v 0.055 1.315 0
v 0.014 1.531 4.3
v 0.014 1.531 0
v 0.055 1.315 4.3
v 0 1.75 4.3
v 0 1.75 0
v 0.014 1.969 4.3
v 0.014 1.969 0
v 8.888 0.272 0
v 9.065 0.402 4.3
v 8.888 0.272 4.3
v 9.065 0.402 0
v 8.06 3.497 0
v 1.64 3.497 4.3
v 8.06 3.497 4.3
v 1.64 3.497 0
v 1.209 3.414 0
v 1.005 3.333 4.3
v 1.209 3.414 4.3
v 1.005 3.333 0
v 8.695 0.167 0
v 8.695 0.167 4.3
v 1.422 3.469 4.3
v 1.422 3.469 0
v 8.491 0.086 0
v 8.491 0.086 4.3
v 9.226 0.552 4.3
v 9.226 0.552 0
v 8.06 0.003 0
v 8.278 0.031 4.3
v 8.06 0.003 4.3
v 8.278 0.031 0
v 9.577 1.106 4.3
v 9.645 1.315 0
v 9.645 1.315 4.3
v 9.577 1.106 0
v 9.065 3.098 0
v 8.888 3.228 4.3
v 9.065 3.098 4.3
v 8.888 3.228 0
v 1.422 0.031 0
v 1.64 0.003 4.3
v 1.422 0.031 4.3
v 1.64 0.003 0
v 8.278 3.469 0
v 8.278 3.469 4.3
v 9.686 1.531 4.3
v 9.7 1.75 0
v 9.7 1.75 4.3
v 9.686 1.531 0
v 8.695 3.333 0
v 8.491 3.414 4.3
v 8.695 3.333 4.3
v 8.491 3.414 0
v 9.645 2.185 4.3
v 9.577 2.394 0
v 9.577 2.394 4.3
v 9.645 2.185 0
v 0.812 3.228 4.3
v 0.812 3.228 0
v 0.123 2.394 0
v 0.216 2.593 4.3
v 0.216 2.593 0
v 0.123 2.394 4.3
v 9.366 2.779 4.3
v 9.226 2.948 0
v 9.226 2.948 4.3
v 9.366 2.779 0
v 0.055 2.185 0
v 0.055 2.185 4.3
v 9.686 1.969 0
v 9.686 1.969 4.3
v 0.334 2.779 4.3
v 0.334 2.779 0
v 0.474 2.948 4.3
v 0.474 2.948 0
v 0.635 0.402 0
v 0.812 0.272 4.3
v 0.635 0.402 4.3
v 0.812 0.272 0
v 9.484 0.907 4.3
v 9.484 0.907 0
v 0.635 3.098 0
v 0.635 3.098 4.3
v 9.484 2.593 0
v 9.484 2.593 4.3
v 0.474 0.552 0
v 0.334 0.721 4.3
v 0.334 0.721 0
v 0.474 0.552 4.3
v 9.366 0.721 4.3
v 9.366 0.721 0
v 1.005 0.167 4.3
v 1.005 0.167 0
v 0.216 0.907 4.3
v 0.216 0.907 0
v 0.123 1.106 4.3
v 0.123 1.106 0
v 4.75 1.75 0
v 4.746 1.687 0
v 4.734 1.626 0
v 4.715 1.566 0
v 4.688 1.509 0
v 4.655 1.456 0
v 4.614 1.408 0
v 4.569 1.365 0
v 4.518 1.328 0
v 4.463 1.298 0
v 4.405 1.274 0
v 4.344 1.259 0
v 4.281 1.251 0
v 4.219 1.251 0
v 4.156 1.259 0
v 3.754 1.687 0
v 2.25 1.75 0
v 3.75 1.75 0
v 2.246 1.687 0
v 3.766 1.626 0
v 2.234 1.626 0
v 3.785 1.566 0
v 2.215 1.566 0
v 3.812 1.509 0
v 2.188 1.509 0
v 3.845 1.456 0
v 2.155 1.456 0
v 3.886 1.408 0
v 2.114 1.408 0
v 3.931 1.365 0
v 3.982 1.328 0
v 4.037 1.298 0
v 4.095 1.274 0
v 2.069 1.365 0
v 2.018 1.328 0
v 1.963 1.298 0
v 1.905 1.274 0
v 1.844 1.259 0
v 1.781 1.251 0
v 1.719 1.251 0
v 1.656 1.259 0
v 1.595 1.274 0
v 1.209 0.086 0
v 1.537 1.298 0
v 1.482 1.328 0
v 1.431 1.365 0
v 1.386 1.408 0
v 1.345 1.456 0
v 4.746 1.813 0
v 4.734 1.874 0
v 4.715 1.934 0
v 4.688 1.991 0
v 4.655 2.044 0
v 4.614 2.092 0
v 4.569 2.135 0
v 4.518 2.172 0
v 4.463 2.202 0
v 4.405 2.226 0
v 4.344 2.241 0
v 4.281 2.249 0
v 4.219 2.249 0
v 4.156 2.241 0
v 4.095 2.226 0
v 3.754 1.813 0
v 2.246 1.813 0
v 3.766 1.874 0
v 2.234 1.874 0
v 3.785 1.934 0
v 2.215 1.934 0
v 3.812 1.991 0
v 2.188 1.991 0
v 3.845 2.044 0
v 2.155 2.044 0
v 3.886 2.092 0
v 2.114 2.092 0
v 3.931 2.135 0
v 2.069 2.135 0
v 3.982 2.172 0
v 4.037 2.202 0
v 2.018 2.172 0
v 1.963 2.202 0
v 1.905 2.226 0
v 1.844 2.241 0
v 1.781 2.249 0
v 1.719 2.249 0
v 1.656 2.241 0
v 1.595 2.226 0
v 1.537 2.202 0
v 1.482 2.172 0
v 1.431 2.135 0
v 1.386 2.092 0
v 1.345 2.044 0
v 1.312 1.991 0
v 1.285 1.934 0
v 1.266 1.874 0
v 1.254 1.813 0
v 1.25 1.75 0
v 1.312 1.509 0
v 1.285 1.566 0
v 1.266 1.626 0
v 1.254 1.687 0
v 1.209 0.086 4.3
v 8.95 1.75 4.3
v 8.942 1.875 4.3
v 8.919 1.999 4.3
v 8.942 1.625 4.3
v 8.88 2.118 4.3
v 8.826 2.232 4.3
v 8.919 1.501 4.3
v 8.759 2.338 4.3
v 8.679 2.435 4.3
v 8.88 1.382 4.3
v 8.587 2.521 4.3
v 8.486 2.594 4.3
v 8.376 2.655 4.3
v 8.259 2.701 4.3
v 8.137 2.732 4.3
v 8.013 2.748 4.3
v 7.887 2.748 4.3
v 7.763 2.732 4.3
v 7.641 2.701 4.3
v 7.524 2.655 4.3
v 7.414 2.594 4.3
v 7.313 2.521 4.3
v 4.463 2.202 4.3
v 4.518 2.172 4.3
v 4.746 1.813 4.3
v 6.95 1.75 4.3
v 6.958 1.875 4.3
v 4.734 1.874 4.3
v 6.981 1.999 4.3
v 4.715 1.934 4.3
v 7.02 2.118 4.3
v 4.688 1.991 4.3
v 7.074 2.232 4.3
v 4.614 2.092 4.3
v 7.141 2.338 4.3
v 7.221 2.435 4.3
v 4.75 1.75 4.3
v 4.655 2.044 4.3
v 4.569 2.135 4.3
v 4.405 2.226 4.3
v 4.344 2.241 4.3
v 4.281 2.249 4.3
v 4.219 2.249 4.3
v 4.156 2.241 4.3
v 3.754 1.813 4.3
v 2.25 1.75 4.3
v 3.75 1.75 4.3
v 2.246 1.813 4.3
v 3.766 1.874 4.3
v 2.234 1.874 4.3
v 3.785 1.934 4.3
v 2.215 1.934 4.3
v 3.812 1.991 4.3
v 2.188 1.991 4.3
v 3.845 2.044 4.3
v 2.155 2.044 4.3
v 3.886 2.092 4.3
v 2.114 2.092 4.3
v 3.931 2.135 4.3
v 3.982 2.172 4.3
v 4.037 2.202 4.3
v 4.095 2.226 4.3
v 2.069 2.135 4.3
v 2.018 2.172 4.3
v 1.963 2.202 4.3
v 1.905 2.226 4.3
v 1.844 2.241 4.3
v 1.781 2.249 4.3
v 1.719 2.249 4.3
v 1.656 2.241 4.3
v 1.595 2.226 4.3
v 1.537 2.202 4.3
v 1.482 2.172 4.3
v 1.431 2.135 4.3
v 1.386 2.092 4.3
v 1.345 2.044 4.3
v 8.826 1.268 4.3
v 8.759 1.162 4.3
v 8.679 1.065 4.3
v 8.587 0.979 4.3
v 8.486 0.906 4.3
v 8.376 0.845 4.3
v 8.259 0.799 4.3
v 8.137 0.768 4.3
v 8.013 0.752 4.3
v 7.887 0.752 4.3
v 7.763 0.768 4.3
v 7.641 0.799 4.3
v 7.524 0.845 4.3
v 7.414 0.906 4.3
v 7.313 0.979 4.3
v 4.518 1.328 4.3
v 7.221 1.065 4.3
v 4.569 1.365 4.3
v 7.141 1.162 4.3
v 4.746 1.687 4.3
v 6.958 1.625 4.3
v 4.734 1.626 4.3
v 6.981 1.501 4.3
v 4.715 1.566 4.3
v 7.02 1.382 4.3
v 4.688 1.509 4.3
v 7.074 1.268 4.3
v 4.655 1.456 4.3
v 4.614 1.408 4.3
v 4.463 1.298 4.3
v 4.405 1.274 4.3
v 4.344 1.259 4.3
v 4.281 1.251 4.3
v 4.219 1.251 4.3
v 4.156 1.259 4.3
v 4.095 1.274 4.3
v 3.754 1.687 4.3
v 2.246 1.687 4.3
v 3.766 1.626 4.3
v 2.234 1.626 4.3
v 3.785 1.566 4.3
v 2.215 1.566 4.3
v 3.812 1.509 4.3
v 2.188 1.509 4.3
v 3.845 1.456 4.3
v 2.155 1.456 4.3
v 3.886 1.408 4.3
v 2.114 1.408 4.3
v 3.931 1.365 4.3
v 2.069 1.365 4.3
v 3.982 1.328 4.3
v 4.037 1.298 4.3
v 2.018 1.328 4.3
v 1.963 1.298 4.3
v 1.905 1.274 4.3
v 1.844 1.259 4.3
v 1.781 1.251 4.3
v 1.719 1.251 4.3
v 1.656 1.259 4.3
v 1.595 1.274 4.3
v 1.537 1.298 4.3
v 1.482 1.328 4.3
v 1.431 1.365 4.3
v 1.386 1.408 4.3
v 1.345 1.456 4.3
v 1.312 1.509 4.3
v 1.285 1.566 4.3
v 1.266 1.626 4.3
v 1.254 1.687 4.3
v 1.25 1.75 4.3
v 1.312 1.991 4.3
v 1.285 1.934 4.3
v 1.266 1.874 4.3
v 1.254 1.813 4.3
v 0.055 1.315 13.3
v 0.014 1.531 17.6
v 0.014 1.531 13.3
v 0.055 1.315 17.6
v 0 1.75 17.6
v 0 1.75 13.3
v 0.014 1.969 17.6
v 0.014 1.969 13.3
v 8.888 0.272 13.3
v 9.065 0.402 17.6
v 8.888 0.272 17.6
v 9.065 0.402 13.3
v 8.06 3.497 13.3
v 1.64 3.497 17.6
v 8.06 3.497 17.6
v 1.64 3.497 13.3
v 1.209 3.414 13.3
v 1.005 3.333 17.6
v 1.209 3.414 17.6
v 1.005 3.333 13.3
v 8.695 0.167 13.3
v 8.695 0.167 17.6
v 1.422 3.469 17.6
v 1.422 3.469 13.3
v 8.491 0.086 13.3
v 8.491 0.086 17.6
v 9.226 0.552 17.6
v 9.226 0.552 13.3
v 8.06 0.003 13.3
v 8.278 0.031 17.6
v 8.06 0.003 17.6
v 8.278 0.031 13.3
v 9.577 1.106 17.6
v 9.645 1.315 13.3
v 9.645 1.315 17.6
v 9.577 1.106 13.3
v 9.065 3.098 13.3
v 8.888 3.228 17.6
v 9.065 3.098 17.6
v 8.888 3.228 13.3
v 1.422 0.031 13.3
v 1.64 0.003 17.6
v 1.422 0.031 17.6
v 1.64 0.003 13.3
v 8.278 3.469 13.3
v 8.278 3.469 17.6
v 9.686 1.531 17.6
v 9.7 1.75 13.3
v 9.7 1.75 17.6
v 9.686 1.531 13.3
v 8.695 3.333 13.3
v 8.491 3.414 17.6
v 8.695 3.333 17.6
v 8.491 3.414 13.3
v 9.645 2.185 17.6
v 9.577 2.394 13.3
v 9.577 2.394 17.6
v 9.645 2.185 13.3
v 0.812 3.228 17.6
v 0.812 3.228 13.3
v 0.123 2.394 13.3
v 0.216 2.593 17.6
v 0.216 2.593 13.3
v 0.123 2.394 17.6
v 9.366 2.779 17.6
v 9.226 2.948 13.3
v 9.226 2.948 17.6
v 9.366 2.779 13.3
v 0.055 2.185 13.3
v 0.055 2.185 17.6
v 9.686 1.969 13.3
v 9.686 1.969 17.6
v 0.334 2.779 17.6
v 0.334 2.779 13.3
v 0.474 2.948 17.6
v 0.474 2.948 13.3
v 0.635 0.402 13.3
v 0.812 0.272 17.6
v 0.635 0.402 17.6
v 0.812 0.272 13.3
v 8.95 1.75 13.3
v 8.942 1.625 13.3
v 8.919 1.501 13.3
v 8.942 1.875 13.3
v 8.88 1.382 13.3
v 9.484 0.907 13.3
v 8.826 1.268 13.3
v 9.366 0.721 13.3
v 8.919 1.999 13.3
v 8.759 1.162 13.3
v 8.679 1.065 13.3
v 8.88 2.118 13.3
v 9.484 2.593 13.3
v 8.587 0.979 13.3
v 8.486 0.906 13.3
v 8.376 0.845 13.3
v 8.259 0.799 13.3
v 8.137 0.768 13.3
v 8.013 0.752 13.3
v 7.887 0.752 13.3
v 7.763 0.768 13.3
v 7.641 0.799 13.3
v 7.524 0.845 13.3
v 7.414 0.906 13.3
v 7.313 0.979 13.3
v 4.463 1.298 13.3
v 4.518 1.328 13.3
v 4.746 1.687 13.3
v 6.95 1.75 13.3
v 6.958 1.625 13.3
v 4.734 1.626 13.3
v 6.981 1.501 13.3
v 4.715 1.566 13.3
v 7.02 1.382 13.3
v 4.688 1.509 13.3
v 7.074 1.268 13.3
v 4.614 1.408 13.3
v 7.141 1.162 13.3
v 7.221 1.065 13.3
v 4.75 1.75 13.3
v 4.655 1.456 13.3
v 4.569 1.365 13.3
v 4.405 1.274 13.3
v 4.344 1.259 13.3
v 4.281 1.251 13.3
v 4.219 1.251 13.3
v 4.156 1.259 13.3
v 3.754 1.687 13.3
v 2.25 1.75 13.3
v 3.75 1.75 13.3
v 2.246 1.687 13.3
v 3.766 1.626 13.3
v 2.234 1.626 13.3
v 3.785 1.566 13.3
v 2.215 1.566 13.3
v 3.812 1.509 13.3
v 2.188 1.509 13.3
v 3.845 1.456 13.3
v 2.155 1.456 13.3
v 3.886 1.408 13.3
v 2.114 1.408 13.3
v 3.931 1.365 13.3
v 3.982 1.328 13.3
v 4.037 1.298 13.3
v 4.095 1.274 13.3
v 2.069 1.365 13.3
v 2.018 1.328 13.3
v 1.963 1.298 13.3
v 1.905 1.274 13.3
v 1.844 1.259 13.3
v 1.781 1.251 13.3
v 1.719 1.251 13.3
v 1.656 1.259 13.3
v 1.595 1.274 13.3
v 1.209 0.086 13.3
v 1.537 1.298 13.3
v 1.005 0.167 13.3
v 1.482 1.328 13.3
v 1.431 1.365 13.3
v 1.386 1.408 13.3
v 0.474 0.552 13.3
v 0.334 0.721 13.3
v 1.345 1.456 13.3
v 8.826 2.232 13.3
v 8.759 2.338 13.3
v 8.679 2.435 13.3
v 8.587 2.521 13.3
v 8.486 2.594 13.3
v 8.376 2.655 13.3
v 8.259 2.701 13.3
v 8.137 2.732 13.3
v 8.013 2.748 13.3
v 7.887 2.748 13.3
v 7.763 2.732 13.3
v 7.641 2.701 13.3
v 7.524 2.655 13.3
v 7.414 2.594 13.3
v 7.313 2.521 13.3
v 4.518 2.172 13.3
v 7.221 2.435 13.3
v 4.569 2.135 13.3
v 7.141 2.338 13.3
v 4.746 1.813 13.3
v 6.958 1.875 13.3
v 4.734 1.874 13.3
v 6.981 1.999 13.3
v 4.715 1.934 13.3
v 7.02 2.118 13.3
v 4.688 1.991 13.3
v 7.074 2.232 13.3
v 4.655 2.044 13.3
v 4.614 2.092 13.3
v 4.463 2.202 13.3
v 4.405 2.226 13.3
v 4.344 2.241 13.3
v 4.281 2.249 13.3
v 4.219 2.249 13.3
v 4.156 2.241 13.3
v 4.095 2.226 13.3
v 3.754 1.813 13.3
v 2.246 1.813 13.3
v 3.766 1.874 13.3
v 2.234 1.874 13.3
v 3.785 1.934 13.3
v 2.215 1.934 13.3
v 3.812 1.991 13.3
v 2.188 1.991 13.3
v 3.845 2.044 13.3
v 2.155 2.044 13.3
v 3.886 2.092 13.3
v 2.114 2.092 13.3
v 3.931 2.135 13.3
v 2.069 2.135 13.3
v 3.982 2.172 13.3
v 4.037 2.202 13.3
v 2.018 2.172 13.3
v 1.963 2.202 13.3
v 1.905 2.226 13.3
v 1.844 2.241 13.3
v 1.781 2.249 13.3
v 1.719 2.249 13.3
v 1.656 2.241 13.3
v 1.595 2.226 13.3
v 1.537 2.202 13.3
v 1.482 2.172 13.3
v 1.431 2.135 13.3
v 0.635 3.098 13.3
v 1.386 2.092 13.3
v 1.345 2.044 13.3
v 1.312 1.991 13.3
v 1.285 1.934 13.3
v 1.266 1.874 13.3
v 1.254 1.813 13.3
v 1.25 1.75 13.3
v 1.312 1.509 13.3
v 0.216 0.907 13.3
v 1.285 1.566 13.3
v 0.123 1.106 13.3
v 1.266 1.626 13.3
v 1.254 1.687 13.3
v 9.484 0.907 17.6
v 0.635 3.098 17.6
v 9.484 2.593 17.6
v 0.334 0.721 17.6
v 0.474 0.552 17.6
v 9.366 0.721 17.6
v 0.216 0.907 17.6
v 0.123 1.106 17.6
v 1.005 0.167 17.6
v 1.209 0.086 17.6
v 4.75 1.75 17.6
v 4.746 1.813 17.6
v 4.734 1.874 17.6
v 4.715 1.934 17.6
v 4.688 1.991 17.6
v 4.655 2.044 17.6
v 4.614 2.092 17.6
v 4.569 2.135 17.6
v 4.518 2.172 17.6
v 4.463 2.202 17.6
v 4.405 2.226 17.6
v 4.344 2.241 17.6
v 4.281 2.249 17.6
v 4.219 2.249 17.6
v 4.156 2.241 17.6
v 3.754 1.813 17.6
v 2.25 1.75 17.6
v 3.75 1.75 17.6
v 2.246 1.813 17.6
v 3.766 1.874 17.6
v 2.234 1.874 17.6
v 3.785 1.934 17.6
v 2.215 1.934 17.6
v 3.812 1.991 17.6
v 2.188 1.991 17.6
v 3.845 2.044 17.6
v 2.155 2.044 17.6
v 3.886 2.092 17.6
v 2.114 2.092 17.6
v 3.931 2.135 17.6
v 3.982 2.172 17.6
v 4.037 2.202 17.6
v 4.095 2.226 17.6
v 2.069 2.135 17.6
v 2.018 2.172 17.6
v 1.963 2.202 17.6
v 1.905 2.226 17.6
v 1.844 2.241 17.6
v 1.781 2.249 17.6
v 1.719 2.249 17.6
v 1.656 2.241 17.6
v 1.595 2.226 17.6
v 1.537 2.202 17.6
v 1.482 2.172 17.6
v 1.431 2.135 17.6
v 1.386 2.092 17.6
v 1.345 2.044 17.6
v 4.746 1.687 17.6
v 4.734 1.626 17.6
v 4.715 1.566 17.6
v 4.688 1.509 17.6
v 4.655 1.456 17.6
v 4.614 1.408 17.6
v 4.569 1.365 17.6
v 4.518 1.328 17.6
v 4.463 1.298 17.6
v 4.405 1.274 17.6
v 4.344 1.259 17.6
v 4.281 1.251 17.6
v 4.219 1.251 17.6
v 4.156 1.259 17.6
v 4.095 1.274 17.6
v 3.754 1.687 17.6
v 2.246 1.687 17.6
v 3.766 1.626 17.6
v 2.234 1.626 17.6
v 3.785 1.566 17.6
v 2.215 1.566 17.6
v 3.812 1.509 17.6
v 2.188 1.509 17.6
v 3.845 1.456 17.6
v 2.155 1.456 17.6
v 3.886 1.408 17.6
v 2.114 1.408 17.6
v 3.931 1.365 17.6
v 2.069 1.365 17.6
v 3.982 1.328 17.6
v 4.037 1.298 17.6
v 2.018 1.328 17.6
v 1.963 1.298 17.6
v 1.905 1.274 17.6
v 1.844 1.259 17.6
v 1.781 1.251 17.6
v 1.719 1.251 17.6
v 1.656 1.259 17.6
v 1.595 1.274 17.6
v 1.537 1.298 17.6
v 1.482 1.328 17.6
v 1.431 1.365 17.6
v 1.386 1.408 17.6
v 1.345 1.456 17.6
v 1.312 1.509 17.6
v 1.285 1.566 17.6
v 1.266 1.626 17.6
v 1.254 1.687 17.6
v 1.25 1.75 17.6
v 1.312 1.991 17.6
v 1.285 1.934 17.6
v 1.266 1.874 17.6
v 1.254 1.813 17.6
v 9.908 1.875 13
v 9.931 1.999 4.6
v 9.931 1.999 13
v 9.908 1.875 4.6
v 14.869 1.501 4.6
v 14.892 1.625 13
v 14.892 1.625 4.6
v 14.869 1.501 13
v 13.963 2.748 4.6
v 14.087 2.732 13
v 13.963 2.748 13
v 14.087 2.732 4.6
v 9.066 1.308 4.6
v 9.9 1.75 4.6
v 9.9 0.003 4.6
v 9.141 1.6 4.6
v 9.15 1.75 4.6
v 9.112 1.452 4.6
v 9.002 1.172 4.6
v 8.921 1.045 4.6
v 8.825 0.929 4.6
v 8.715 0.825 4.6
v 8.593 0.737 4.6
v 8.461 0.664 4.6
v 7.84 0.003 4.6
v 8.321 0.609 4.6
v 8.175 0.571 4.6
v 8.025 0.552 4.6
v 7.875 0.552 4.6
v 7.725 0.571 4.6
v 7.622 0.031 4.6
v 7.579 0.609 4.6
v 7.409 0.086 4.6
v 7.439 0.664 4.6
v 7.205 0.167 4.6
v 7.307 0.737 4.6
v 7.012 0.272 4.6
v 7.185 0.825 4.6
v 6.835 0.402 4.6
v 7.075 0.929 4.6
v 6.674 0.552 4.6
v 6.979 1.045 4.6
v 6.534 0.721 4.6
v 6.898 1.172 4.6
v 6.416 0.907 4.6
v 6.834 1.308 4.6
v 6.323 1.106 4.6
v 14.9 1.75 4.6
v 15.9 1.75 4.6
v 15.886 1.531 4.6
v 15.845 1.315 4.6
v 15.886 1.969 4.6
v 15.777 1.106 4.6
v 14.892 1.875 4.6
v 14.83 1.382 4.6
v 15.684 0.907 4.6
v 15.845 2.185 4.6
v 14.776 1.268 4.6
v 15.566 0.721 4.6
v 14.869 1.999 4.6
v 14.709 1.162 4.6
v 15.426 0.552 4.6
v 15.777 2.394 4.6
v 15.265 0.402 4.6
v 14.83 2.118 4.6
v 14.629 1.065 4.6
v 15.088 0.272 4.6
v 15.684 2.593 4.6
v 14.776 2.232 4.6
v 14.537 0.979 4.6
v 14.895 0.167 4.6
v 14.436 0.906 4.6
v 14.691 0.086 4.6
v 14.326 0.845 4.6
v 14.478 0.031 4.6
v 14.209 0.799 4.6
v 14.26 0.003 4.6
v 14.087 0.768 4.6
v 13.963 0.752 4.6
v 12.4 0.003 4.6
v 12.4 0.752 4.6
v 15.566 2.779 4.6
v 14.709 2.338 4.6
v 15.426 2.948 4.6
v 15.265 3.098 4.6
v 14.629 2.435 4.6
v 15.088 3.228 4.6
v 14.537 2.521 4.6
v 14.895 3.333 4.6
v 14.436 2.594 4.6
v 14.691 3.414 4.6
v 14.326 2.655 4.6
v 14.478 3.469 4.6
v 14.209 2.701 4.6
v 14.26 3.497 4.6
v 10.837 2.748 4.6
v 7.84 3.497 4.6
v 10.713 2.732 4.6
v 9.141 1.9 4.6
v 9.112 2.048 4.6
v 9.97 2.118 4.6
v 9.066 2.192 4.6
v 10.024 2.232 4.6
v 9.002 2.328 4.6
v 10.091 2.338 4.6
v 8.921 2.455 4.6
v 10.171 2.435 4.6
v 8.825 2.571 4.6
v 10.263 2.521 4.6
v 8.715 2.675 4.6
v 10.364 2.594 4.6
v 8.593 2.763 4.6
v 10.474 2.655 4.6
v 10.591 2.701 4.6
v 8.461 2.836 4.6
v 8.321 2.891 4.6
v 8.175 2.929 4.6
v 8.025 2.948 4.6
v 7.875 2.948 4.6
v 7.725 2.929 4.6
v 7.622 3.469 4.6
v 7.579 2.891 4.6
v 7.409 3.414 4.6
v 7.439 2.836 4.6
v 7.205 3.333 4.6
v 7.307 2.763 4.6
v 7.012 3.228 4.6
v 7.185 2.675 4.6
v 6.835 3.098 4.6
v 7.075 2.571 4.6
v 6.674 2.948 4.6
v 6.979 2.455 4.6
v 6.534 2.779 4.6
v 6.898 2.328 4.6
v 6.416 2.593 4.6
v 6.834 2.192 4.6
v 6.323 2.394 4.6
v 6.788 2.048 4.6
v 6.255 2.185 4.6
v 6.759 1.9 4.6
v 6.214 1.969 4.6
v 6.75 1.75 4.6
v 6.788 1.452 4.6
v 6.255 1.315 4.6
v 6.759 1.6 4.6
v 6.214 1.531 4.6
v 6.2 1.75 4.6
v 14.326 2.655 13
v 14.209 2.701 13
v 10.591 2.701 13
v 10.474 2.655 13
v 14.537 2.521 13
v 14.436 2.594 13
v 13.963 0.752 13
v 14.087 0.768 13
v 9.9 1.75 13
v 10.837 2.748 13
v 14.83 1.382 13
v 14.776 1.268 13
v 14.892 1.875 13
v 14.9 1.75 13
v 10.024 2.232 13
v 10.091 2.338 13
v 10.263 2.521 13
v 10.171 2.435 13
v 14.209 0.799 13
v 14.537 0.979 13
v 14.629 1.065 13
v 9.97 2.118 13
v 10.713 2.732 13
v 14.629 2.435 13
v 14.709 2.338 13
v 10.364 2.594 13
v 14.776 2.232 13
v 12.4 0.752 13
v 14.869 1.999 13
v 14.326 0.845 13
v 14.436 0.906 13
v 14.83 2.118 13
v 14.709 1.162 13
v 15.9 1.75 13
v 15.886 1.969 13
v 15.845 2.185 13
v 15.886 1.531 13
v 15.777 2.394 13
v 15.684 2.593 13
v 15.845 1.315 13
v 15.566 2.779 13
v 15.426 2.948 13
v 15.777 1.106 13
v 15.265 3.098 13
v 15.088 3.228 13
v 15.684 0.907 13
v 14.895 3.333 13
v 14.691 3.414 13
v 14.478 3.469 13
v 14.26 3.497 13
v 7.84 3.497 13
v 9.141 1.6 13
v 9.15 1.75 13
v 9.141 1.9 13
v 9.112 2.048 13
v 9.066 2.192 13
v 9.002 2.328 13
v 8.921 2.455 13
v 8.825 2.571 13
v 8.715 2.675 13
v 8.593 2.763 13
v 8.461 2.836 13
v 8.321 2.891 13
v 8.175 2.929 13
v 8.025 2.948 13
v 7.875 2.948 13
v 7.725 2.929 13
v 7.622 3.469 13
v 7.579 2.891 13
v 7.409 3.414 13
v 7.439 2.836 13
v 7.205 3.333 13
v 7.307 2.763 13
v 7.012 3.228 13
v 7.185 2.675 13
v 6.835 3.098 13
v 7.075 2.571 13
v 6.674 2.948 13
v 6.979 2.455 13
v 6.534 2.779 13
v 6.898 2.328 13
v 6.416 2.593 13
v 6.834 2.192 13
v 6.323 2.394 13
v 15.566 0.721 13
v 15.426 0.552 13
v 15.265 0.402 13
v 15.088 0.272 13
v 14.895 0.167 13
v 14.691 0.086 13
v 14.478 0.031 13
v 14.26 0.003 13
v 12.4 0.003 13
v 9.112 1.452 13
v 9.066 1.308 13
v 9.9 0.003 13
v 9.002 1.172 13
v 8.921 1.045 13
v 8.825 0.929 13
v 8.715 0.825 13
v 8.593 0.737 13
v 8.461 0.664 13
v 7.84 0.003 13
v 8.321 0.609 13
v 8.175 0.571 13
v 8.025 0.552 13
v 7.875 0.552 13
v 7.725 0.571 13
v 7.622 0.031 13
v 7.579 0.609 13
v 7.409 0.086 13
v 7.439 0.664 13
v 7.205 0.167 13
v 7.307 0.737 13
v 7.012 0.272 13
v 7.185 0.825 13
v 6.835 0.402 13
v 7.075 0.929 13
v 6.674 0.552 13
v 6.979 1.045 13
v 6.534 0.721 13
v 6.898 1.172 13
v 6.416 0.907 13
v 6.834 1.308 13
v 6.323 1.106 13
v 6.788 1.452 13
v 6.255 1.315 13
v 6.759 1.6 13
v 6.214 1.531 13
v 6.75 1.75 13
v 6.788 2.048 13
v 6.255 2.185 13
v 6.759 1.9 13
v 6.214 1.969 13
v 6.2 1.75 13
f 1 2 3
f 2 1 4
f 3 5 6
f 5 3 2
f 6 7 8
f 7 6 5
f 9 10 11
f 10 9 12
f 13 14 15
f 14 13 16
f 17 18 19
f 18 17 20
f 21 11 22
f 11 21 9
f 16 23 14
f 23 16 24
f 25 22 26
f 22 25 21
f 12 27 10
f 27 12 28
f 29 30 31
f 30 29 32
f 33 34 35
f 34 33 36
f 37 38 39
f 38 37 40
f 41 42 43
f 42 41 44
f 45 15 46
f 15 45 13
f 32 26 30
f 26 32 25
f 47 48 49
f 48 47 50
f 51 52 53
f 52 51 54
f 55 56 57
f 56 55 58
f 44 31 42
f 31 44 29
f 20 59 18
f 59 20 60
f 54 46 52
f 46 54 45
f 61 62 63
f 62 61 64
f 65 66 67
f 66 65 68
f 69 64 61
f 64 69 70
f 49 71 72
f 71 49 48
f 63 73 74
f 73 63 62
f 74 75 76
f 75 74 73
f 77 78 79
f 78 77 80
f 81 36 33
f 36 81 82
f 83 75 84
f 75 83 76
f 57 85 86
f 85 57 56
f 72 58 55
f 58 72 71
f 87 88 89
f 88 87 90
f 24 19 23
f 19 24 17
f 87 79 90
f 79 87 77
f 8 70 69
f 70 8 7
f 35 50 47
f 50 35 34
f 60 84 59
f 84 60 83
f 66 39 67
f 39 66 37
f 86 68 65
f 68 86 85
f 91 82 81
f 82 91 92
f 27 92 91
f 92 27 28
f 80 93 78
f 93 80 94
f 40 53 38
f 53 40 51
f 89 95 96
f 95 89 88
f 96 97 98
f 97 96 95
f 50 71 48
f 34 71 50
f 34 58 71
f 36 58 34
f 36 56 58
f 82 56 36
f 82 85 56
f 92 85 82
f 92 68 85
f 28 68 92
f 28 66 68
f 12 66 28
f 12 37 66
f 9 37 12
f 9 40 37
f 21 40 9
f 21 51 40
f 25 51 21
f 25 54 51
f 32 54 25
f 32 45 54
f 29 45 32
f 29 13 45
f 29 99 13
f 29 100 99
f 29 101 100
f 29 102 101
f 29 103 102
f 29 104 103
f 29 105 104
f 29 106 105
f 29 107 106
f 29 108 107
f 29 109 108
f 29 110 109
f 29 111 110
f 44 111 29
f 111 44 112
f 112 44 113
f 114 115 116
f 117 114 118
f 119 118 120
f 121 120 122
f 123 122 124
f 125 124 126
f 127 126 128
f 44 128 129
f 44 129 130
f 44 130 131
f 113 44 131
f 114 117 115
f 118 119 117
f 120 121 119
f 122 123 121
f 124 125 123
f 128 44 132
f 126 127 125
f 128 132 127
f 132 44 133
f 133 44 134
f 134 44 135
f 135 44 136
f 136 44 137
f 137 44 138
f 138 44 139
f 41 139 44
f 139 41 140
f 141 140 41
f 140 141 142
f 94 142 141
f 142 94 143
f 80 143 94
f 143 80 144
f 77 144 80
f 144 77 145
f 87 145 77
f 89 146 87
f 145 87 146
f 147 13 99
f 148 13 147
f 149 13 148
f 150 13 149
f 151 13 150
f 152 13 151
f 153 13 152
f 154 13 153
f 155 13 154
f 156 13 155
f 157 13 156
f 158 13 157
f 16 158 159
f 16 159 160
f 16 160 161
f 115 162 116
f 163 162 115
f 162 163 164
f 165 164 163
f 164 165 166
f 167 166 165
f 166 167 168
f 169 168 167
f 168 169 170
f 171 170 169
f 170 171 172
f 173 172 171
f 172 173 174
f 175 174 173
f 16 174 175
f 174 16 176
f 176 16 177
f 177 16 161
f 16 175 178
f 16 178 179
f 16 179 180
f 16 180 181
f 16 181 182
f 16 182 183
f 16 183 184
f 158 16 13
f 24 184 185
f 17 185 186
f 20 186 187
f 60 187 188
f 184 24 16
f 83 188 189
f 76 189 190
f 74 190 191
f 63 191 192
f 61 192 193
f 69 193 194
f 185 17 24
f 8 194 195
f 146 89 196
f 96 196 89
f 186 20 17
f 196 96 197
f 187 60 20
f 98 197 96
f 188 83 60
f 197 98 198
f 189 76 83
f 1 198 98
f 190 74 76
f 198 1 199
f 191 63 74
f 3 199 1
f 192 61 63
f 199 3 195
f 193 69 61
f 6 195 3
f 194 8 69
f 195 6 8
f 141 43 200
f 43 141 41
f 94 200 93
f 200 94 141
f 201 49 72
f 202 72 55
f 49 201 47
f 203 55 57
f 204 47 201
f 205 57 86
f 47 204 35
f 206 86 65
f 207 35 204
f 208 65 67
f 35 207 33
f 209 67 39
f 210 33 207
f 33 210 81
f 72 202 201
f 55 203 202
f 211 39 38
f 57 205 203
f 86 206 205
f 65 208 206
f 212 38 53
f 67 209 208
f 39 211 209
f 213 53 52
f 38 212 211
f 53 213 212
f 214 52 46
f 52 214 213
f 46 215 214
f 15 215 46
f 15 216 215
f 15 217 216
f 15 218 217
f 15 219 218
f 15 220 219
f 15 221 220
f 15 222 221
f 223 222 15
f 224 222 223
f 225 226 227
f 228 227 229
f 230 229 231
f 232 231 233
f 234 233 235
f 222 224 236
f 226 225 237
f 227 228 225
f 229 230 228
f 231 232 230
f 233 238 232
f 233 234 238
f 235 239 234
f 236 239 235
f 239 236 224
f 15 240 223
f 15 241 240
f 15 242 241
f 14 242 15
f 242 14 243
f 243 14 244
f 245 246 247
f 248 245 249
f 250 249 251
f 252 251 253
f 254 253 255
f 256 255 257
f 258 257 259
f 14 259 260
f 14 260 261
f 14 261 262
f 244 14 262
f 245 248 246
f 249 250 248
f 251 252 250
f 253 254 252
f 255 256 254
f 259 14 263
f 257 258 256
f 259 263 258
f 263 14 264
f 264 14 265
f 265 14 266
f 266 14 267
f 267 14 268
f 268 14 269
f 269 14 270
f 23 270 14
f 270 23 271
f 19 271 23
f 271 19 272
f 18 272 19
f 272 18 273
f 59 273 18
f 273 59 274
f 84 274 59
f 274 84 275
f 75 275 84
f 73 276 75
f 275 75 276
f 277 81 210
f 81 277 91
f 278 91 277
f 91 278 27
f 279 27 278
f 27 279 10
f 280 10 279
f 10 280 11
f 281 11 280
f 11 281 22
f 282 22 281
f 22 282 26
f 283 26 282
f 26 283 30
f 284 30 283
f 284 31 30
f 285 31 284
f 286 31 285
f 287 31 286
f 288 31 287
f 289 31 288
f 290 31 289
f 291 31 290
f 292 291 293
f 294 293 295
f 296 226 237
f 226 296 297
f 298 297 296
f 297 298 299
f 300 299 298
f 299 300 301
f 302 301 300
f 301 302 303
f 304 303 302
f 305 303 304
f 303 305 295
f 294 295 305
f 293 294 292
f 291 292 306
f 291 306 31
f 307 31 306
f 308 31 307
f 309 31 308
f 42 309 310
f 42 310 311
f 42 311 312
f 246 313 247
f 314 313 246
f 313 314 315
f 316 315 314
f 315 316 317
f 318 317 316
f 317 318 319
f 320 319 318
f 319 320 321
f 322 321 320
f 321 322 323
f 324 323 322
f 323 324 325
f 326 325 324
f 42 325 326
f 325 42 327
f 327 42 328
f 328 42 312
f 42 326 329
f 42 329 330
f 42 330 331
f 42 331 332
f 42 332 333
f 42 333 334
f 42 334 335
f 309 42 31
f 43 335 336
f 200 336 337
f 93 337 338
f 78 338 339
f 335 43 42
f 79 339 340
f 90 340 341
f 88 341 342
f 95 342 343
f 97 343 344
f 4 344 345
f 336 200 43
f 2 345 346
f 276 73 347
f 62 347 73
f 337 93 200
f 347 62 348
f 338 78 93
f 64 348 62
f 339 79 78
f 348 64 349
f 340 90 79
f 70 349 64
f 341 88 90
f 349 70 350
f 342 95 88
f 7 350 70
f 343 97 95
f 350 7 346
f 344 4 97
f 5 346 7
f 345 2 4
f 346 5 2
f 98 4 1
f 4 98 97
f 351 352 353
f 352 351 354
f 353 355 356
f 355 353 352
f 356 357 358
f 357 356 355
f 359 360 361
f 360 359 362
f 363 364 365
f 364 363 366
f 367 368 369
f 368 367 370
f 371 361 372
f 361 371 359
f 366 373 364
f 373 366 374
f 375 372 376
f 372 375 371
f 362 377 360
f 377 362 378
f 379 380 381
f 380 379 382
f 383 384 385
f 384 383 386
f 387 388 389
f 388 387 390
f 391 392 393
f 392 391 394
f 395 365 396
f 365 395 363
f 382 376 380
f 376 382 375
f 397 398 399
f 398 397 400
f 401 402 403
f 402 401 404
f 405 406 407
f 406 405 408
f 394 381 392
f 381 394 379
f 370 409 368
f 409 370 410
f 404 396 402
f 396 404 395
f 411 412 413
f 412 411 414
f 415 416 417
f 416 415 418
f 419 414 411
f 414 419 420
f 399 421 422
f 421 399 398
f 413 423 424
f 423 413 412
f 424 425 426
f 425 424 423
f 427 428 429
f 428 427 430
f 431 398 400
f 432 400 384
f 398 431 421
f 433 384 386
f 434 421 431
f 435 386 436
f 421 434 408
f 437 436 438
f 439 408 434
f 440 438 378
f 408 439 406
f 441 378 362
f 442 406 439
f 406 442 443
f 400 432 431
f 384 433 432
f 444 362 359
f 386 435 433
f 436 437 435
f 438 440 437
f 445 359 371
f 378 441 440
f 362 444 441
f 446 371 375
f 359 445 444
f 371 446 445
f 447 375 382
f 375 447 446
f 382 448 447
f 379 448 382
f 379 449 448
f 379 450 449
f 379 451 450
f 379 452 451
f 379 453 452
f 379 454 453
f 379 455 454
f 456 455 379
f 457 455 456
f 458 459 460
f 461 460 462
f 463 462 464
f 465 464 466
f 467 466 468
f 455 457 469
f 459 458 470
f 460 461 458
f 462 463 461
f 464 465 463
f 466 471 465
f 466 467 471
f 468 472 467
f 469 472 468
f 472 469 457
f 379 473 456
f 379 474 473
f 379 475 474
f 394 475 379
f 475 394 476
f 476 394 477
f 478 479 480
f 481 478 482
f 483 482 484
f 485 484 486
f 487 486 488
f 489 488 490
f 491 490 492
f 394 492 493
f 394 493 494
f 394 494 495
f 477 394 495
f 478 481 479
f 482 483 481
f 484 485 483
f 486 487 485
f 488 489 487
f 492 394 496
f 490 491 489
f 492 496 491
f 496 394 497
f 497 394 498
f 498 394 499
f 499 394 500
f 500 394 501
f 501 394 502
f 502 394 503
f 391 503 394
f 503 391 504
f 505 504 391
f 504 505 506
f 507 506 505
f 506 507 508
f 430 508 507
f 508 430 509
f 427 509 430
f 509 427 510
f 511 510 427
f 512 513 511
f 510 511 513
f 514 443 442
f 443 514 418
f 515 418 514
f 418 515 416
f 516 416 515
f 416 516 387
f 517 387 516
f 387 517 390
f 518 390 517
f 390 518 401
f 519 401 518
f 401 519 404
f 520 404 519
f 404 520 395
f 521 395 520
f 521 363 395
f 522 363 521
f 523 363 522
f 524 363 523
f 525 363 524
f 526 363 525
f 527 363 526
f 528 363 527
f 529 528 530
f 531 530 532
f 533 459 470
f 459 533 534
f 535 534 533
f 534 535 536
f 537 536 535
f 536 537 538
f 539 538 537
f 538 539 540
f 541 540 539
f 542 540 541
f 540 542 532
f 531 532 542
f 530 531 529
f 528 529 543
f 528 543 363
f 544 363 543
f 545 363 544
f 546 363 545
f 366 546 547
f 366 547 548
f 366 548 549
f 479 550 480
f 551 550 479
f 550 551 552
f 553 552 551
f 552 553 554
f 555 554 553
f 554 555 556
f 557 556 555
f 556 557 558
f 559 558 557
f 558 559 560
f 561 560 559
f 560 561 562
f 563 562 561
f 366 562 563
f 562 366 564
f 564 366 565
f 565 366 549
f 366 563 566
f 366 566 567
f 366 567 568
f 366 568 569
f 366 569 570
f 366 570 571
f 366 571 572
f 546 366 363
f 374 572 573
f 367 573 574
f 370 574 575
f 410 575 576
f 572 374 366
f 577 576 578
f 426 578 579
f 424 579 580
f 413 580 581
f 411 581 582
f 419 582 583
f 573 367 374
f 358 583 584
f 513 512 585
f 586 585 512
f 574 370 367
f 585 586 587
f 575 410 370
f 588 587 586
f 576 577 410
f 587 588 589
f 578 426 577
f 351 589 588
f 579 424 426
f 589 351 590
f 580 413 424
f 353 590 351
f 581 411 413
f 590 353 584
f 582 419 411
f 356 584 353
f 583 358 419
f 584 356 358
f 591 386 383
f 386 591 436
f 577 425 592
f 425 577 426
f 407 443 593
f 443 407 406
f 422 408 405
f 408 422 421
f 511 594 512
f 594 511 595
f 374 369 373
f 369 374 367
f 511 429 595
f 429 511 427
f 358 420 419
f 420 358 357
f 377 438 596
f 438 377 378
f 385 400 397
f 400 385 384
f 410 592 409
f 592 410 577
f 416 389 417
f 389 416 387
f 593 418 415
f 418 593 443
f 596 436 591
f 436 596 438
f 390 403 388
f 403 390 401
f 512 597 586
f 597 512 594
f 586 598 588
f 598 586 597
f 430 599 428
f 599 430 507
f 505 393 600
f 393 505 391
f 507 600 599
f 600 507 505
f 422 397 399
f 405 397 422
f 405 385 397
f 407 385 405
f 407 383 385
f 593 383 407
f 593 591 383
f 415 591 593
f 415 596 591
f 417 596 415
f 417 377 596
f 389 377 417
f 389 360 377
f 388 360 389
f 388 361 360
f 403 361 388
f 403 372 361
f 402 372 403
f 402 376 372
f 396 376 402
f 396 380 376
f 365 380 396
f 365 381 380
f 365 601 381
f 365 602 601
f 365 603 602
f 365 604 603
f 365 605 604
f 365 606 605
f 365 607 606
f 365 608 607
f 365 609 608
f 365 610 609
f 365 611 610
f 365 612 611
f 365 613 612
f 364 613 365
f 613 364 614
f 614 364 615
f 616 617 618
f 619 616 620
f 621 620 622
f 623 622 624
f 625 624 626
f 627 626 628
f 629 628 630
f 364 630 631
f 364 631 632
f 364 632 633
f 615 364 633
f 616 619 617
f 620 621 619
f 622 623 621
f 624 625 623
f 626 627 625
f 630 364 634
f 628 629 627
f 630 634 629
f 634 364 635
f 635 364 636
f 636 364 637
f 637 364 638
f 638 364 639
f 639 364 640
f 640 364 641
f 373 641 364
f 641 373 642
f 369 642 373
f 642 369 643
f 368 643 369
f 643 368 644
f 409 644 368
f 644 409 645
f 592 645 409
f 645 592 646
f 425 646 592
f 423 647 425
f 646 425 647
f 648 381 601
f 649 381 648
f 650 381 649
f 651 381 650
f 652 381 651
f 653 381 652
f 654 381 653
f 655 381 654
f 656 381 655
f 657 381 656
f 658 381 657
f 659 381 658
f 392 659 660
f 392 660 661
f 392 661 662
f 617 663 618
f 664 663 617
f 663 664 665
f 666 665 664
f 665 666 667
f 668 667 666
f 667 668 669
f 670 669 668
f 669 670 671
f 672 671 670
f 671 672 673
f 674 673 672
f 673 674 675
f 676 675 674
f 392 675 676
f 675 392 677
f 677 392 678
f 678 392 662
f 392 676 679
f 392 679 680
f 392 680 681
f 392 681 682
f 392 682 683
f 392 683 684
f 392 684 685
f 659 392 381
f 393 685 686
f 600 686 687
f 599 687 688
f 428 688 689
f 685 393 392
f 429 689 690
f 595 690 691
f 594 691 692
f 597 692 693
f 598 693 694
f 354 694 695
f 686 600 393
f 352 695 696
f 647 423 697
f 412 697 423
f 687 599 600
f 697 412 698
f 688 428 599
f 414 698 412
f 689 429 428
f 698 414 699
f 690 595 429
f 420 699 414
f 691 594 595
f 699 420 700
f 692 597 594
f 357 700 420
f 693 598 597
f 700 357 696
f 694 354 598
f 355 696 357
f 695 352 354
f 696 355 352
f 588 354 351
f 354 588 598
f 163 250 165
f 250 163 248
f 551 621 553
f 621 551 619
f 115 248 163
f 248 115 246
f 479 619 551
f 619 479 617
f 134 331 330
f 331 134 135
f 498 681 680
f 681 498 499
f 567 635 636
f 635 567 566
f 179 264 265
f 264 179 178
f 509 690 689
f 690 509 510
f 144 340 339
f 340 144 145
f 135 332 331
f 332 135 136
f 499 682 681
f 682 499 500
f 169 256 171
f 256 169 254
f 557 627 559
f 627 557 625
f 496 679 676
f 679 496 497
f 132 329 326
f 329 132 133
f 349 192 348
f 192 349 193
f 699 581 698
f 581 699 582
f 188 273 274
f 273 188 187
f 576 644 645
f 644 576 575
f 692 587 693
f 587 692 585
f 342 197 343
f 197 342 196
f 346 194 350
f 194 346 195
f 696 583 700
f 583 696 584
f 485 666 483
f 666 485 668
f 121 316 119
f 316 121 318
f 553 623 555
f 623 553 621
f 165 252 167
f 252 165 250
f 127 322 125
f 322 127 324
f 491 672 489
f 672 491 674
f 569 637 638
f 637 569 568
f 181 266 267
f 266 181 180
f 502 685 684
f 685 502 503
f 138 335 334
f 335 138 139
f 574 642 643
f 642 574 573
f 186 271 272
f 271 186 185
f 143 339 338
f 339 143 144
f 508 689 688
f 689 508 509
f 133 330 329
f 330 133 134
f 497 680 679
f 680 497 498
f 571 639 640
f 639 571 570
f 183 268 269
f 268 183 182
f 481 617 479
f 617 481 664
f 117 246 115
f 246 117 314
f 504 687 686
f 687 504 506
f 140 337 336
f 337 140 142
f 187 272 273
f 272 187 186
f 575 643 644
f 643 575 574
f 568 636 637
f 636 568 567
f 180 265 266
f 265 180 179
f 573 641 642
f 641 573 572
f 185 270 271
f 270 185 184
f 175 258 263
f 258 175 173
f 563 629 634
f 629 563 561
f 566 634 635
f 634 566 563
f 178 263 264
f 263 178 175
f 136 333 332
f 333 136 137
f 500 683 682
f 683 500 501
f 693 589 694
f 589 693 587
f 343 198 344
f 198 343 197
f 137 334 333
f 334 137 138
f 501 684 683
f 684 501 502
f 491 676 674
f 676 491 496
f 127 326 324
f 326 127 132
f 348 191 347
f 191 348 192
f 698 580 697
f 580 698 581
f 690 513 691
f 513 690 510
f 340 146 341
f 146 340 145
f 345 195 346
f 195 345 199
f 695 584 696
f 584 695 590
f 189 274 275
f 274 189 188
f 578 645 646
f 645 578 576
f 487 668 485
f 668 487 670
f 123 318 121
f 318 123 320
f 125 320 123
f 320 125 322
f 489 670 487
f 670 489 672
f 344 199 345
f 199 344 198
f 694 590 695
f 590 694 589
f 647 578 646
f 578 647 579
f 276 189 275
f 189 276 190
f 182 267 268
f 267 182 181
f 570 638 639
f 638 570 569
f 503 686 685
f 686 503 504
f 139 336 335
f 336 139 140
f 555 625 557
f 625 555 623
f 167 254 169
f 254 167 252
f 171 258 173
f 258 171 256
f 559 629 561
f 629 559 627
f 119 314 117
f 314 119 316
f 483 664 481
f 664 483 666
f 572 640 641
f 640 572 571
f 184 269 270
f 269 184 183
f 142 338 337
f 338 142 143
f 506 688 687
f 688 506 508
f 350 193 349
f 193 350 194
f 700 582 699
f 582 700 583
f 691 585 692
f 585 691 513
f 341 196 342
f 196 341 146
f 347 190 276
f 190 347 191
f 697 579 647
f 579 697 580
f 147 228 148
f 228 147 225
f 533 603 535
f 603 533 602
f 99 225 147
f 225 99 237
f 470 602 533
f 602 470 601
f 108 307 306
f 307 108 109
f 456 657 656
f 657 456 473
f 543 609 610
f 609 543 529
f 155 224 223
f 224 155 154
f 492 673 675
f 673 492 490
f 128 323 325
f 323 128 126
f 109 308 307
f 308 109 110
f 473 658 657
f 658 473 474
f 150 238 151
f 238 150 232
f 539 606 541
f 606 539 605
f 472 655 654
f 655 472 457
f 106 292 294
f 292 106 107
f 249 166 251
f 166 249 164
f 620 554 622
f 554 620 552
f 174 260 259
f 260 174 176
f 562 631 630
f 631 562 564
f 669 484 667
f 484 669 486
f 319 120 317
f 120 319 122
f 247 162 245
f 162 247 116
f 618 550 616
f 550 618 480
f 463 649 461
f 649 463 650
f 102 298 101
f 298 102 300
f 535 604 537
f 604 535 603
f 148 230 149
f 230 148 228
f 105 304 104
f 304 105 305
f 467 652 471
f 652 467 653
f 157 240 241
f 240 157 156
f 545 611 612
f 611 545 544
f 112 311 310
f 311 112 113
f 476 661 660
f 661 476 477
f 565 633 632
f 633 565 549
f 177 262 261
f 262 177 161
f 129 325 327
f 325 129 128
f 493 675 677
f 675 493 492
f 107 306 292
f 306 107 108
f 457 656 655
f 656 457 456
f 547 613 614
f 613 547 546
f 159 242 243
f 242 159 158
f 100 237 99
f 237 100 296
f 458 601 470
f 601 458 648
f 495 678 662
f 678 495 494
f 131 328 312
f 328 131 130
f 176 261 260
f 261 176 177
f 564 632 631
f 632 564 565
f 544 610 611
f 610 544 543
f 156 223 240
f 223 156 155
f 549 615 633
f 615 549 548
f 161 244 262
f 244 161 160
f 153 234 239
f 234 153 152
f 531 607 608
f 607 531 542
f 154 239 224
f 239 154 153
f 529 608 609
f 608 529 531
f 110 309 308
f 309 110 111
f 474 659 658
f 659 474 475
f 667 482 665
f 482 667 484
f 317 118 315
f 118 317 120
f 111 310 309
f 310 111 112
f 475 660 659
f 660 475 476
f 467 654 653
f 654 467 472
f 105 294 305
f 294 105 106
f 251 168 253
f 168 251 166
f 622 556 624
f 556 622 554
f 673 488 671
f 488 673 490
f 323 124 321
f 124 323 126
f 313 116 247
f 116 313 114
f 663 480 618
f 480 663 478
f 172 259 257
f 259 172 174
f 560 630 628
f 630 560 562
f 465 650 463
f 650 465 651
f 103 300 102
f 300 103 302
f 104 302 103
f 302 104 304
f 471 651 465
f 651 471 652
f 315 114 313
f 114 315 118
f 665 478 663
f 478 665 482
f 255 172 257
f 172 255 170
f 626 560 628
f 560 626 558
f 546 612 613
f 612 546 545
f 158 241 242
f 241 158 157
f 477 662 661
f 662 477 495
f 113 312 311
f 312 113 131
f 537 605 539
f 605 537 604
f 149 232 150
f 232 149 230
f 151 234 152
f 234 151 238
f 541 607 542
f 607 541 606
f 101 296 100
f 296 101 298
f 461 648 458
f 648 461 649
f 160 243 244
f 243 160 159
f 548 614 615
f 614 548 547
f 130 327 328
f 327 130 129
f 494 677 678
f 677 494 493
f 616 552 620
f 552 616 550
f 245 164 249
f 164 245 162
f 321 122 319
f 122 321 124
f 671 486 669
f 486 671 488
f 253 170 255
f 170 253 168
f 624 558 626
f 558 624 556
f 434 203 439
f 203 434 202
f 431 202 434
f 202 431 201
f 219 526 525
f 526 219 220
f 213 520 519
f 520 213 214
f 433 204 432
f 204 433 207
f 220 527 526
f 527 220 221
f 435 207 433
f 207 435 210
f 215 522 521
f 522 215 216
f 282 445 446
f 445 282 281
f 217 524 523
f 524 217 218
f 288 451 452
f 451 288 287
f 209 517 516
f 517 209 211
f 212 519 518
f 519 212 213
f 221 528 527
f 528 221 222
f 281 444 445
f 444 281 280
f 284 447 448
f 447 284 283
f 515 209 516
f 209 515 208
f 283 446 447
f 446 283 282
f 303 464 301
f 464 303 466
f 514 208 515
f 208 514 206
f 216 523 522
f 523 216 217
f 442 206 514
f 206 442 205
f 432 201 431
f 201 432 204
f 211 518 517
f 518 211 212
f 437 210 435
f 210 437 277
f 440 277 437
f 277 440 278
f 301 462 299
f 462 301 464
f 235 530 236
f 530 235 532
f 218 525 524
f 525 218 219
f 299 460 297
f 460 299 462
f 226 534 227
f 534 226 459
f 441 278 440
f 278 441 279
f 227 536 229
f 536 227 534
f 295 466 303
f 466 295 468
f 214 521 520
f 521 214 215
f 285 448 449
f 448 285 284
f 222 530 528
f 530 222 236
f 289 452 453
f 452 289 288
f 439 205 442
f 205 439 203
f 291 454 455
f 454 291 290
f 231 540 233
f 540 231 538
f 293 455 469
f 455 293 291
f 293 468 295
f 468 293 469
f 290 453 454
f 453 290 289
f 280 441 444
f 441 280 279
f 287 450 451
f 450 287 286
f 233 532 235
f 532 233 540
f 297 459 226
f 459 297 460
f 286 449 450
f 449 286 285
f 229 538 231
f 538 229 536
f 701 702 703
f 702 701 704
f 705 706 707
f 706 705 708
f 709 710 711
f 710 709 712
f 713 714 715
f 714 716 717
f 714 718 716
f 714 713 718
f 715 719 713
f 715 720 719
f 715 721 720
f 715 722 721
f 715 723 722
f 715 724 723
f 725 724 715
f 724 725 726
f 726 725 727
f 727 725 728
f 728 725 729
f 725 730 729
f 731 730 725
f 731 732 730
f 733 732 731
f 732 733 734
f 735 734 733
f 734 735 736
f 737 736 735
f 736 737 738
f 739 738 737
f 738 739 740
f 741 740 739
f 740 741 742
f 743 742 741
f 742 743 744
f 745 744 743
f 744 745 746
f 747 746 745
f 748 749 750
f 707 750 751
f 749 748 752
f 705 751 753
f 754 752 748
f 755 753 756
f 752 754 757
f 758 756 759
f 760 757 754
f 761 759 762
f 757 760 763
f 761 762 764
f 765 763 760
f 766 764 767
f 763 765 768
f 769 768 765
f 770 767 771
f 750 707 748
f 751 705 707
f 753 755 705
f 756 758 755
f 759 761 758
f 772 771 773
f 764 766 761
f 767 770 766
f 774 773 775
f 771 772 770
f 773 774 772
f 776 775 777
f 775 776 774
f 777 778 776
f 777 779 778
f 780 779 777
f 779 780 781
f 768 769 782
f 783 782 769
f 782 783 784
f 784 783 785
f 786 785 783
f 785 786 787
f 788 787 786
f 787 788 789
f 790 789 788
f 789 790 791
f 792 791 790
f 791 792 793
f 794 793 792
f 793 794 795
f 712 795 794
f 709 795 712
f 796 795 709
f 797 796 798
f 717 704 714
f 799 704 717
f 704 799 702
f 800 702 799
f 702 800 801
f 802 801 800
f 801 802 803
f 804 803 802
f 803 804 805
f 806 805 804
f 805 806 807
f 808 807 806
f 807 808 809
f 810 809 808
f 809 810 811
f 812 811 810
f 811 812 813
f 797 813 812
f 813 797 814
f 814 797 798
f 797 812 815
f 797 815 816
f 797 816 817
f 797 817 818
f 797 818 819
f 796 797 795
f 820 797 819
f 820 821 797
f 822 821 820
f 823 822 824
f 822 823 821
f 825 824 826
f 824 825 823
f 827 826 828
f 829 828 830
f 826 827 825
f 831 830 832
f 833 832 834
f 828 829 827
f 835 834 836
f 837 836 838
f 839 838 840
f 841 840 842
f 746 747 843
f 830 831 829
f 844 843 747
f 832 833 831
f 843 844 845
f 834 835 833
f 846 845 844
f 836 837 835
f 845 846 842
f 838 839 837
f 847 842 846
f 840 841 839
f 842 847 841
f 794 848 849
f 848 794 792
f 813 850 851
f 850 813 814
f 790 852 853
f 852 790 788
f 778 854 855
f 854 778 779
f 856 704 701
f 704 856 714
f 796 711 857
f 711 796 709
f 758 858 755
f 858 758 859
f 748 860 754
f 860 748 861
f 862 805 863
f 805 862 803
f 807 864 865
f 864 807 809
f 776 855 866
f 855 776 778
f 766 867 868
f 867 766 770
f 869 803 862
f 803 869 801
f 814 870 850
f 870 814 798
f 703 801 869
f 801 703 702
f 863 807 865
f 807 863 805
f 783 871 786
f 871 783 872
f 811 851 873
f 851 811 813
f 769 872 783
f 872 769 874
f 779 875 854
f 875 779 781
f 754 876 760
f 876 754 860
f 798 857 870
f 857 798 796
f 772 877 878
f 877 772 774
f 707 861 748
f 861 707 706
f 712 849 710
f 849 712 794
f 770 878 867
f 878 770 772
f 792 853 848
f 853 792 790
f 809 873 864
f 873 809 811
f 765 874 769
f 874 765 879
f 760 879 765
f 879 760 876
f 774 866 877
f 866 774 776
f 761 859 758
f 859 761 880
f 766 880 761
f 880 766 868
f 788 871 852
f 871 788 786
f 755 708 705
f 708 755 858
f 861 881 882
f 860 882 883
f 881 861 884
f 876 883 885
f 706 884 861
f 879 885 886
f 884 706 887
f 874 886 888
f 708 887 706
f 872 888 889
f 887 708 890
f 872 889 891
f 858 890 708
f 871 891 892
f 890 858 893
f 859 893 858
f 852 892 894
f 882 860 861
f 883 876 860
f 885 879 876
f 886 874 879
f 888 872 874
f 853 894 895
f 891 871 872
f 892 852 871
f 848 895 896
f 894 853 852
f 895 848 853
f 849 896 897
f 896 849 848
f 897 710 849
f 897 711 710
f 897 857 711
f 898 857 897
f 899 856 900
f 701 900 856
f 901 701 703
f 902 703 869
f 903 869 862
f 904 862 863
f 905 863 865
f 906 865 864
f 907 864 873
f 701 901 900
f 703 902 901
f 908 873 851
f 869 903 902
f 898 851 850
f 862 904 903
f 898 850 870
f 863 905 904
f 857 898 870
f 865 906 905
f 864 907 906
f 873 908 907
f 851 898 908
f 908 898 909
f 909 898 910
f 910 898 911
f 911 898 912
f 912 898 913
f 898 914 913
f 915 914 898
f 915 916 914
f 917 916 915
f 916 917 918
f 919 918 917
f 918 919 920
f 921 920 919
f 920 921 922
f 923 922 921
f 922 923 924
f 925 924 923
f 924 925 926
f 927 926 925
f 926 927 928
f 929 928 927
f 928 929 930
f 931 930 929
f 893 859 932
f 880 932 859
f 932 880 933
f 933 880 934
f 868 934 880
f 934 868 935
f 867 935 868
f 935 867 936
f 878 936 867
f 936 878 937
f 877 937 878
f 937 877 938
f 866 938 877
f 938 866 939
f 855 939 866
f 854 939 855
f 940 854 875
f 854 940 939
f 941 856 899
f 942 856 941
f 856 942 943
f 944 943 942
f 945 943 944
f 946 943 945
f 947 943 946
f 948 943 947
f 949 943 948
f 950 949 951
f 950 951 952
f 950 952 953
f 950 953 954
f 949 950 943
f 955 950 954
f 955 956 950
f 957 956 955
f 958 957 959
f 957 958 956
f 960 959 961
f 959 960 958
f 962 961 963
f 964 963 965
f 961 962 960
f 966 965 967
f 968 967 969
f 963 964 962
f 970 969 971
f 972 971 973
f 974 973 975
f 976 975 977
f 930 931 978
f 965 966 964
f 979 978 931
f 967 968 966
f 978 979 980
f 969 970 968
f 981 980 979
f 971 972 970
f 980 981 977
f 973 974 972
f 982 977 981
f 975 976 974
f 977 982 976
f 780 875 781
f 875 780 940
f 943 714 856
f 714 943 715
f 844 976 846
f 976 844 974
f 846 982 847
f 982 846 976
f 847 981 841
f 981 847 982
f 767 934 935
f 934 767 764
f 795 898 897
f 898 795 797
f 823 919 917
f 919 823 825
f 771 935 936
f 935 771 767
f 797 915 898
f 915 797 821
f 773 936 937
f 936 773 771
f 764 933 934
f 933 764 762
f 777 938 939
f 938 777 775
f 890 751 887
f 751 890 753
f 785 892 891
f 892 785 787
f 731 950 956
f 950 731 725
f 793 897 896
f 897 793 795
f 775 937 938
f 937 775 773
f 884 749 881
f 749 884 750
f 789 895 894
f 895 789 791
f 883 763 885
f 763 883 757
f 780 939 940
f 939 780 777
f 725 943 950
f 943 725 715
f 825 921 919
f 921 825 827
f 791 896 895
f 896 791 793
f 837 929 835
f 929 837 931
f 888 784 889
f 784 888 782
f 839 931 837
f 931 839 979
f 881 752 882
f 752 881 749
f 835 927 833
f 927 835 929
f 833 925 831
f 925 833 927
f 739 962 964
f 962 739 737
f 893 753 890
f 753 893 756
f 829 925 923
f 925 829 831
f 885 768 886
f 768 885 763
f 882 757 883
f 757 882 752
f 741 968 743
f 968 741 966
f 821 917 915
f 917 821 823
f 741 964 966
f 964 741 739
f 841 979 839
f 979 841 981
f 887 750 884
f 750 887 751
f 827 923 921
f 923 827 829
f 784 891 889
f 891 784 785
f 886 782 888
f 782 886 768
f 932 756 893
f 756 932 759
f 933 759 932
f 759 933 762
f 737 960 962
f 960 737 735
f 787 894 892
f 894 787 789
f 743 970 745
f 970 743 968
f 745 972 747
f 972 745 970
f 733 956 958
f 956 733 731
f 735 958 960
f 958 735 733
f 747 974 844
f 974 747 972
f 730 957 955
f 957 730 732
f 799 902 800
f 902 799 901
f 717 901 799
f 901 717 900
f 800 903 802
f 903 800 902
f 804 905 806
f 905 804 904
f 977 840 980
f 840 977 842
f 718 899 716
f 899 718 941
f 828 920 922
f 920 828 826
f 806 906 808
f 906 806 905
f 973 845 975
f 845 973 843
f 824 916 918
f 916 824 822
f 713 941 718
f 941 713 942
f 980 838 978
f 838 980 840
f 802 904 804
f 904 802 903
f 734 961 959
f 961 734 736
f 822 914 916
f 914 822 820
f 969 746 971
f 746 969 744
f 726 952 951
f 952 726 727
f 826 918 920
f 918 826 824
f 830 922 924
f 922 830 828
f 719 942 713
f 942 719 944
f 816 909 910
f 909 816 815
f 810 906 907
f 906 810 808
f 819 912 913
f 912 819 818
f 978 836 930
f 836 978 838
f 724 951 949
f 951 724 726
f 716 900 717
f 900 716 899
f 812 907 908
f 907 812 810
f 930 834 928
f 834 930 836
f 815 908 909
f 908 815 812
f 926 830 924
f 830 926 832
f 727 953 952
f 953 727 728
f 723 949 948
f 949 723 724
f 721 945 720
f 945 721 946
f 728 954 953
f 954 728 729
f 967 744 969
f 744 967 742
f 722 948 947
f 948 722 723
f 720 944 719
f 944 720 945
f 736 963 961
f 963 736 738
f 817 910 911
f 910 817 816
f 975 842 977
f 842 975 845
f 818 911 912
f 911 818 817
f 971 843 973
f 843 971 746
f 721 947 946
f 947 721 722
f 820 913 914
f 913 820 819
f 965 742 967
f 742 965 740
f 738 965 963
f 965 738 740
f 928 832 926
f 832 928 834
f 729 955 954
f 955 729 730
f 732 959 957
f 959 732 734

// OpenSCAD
$fn = 50;

segment_length = 9.7;
segment_height = 3.5;
hook_segment_width = 8.4;
bar_segment_inner_space = 9;
bar_segment_surround_width = 4.3;
bar_segment_width =
  bar_segment_inner_space + (bar_segment_surround_width * 2);
bar_radius = 0.5;

link_bar_diameter = 1;
link_bar_hole_diameter = 1.2;

segment_radius = segment_height / 2;
hook_inner_radius = 2;
hook_length = 5;
hook_thickness = 1;

module elipse_thing_profile(length, height) {
  radius = height / 2;
  hull() {
    translate([radius, radius, 0])
      circle(radius);

    translate([length - radius, radius, 0])
      circle(radius);
  }
}

module bar_hole() {
  translate([segment_radius, segment_radius, 0])
    cylinder(bar_segment_width, r1 = bar_radius, r2 = bar_radius);
}

module bar_link() {
  translate([segment_length - segment_radius, segment_radius, 0])
    cylinder(
      bar_segment_width,
      r1 = link_bar_diameter,
      r2 = link_bar_diameter
    );
}


module bar_segment_surrounds() {
  linear_extrude(bar_segment_surround_width)
    elipse_thing_profile(segment_length, segment_height);

  translate([0, 0, bar_segment_surround_width + bar_segment_inner_space])
    linear_extrude(bar_segment_surround_width)
      elipse_thing_profile(segment_length, segment_height);
}

module bar_segment() {
  #bar_link();
  difference() {
    bar_segment_surrounds();
    bar_hole();
    translate([2.5, 0, 0])
      bar_hole();
  }
}

module move_hook_segment() {
  translate(
    [
      segment_length - segment_height,
      0,
      bar_segment_surround_width + (bar_segment_inner_space - hook_segment_width) / 2
    ]
  )
    children();
}

module hook_inner() {
  translate(
    [
      segment_length - hook_length - hook_thickness,
      segment_height / 2 - hook_inner_radius / 2,
      0
    ]
  ) {
    linear_extrude(hook_segment_width)
      elipse_thing_profile(hook_length, hook_inner_radius);
    translate([0, -(hook_inner_radius / 2), 0])
      cube(
        [
          hook_length * 0.5,
          hook_inner_radius,
          hook_segment_width
        ]
      );
  }
}

module hook_segment() {
  difference() {
    linear_extrude(hook_segment_width)
      elipse_thing_profile(segment_length, segment_height);
    hook_inner();
  }
}

bar_segment();
move_hook_segment() {
  difference() {
    hook_segment();
    translate([segment_radius, segment_radius, 0])
      cylinder(
        bar_segment_width,
        r1 = link_bar_hole_diameter,
        r2 = link_bar_hole_diameter
      );
  }
}
